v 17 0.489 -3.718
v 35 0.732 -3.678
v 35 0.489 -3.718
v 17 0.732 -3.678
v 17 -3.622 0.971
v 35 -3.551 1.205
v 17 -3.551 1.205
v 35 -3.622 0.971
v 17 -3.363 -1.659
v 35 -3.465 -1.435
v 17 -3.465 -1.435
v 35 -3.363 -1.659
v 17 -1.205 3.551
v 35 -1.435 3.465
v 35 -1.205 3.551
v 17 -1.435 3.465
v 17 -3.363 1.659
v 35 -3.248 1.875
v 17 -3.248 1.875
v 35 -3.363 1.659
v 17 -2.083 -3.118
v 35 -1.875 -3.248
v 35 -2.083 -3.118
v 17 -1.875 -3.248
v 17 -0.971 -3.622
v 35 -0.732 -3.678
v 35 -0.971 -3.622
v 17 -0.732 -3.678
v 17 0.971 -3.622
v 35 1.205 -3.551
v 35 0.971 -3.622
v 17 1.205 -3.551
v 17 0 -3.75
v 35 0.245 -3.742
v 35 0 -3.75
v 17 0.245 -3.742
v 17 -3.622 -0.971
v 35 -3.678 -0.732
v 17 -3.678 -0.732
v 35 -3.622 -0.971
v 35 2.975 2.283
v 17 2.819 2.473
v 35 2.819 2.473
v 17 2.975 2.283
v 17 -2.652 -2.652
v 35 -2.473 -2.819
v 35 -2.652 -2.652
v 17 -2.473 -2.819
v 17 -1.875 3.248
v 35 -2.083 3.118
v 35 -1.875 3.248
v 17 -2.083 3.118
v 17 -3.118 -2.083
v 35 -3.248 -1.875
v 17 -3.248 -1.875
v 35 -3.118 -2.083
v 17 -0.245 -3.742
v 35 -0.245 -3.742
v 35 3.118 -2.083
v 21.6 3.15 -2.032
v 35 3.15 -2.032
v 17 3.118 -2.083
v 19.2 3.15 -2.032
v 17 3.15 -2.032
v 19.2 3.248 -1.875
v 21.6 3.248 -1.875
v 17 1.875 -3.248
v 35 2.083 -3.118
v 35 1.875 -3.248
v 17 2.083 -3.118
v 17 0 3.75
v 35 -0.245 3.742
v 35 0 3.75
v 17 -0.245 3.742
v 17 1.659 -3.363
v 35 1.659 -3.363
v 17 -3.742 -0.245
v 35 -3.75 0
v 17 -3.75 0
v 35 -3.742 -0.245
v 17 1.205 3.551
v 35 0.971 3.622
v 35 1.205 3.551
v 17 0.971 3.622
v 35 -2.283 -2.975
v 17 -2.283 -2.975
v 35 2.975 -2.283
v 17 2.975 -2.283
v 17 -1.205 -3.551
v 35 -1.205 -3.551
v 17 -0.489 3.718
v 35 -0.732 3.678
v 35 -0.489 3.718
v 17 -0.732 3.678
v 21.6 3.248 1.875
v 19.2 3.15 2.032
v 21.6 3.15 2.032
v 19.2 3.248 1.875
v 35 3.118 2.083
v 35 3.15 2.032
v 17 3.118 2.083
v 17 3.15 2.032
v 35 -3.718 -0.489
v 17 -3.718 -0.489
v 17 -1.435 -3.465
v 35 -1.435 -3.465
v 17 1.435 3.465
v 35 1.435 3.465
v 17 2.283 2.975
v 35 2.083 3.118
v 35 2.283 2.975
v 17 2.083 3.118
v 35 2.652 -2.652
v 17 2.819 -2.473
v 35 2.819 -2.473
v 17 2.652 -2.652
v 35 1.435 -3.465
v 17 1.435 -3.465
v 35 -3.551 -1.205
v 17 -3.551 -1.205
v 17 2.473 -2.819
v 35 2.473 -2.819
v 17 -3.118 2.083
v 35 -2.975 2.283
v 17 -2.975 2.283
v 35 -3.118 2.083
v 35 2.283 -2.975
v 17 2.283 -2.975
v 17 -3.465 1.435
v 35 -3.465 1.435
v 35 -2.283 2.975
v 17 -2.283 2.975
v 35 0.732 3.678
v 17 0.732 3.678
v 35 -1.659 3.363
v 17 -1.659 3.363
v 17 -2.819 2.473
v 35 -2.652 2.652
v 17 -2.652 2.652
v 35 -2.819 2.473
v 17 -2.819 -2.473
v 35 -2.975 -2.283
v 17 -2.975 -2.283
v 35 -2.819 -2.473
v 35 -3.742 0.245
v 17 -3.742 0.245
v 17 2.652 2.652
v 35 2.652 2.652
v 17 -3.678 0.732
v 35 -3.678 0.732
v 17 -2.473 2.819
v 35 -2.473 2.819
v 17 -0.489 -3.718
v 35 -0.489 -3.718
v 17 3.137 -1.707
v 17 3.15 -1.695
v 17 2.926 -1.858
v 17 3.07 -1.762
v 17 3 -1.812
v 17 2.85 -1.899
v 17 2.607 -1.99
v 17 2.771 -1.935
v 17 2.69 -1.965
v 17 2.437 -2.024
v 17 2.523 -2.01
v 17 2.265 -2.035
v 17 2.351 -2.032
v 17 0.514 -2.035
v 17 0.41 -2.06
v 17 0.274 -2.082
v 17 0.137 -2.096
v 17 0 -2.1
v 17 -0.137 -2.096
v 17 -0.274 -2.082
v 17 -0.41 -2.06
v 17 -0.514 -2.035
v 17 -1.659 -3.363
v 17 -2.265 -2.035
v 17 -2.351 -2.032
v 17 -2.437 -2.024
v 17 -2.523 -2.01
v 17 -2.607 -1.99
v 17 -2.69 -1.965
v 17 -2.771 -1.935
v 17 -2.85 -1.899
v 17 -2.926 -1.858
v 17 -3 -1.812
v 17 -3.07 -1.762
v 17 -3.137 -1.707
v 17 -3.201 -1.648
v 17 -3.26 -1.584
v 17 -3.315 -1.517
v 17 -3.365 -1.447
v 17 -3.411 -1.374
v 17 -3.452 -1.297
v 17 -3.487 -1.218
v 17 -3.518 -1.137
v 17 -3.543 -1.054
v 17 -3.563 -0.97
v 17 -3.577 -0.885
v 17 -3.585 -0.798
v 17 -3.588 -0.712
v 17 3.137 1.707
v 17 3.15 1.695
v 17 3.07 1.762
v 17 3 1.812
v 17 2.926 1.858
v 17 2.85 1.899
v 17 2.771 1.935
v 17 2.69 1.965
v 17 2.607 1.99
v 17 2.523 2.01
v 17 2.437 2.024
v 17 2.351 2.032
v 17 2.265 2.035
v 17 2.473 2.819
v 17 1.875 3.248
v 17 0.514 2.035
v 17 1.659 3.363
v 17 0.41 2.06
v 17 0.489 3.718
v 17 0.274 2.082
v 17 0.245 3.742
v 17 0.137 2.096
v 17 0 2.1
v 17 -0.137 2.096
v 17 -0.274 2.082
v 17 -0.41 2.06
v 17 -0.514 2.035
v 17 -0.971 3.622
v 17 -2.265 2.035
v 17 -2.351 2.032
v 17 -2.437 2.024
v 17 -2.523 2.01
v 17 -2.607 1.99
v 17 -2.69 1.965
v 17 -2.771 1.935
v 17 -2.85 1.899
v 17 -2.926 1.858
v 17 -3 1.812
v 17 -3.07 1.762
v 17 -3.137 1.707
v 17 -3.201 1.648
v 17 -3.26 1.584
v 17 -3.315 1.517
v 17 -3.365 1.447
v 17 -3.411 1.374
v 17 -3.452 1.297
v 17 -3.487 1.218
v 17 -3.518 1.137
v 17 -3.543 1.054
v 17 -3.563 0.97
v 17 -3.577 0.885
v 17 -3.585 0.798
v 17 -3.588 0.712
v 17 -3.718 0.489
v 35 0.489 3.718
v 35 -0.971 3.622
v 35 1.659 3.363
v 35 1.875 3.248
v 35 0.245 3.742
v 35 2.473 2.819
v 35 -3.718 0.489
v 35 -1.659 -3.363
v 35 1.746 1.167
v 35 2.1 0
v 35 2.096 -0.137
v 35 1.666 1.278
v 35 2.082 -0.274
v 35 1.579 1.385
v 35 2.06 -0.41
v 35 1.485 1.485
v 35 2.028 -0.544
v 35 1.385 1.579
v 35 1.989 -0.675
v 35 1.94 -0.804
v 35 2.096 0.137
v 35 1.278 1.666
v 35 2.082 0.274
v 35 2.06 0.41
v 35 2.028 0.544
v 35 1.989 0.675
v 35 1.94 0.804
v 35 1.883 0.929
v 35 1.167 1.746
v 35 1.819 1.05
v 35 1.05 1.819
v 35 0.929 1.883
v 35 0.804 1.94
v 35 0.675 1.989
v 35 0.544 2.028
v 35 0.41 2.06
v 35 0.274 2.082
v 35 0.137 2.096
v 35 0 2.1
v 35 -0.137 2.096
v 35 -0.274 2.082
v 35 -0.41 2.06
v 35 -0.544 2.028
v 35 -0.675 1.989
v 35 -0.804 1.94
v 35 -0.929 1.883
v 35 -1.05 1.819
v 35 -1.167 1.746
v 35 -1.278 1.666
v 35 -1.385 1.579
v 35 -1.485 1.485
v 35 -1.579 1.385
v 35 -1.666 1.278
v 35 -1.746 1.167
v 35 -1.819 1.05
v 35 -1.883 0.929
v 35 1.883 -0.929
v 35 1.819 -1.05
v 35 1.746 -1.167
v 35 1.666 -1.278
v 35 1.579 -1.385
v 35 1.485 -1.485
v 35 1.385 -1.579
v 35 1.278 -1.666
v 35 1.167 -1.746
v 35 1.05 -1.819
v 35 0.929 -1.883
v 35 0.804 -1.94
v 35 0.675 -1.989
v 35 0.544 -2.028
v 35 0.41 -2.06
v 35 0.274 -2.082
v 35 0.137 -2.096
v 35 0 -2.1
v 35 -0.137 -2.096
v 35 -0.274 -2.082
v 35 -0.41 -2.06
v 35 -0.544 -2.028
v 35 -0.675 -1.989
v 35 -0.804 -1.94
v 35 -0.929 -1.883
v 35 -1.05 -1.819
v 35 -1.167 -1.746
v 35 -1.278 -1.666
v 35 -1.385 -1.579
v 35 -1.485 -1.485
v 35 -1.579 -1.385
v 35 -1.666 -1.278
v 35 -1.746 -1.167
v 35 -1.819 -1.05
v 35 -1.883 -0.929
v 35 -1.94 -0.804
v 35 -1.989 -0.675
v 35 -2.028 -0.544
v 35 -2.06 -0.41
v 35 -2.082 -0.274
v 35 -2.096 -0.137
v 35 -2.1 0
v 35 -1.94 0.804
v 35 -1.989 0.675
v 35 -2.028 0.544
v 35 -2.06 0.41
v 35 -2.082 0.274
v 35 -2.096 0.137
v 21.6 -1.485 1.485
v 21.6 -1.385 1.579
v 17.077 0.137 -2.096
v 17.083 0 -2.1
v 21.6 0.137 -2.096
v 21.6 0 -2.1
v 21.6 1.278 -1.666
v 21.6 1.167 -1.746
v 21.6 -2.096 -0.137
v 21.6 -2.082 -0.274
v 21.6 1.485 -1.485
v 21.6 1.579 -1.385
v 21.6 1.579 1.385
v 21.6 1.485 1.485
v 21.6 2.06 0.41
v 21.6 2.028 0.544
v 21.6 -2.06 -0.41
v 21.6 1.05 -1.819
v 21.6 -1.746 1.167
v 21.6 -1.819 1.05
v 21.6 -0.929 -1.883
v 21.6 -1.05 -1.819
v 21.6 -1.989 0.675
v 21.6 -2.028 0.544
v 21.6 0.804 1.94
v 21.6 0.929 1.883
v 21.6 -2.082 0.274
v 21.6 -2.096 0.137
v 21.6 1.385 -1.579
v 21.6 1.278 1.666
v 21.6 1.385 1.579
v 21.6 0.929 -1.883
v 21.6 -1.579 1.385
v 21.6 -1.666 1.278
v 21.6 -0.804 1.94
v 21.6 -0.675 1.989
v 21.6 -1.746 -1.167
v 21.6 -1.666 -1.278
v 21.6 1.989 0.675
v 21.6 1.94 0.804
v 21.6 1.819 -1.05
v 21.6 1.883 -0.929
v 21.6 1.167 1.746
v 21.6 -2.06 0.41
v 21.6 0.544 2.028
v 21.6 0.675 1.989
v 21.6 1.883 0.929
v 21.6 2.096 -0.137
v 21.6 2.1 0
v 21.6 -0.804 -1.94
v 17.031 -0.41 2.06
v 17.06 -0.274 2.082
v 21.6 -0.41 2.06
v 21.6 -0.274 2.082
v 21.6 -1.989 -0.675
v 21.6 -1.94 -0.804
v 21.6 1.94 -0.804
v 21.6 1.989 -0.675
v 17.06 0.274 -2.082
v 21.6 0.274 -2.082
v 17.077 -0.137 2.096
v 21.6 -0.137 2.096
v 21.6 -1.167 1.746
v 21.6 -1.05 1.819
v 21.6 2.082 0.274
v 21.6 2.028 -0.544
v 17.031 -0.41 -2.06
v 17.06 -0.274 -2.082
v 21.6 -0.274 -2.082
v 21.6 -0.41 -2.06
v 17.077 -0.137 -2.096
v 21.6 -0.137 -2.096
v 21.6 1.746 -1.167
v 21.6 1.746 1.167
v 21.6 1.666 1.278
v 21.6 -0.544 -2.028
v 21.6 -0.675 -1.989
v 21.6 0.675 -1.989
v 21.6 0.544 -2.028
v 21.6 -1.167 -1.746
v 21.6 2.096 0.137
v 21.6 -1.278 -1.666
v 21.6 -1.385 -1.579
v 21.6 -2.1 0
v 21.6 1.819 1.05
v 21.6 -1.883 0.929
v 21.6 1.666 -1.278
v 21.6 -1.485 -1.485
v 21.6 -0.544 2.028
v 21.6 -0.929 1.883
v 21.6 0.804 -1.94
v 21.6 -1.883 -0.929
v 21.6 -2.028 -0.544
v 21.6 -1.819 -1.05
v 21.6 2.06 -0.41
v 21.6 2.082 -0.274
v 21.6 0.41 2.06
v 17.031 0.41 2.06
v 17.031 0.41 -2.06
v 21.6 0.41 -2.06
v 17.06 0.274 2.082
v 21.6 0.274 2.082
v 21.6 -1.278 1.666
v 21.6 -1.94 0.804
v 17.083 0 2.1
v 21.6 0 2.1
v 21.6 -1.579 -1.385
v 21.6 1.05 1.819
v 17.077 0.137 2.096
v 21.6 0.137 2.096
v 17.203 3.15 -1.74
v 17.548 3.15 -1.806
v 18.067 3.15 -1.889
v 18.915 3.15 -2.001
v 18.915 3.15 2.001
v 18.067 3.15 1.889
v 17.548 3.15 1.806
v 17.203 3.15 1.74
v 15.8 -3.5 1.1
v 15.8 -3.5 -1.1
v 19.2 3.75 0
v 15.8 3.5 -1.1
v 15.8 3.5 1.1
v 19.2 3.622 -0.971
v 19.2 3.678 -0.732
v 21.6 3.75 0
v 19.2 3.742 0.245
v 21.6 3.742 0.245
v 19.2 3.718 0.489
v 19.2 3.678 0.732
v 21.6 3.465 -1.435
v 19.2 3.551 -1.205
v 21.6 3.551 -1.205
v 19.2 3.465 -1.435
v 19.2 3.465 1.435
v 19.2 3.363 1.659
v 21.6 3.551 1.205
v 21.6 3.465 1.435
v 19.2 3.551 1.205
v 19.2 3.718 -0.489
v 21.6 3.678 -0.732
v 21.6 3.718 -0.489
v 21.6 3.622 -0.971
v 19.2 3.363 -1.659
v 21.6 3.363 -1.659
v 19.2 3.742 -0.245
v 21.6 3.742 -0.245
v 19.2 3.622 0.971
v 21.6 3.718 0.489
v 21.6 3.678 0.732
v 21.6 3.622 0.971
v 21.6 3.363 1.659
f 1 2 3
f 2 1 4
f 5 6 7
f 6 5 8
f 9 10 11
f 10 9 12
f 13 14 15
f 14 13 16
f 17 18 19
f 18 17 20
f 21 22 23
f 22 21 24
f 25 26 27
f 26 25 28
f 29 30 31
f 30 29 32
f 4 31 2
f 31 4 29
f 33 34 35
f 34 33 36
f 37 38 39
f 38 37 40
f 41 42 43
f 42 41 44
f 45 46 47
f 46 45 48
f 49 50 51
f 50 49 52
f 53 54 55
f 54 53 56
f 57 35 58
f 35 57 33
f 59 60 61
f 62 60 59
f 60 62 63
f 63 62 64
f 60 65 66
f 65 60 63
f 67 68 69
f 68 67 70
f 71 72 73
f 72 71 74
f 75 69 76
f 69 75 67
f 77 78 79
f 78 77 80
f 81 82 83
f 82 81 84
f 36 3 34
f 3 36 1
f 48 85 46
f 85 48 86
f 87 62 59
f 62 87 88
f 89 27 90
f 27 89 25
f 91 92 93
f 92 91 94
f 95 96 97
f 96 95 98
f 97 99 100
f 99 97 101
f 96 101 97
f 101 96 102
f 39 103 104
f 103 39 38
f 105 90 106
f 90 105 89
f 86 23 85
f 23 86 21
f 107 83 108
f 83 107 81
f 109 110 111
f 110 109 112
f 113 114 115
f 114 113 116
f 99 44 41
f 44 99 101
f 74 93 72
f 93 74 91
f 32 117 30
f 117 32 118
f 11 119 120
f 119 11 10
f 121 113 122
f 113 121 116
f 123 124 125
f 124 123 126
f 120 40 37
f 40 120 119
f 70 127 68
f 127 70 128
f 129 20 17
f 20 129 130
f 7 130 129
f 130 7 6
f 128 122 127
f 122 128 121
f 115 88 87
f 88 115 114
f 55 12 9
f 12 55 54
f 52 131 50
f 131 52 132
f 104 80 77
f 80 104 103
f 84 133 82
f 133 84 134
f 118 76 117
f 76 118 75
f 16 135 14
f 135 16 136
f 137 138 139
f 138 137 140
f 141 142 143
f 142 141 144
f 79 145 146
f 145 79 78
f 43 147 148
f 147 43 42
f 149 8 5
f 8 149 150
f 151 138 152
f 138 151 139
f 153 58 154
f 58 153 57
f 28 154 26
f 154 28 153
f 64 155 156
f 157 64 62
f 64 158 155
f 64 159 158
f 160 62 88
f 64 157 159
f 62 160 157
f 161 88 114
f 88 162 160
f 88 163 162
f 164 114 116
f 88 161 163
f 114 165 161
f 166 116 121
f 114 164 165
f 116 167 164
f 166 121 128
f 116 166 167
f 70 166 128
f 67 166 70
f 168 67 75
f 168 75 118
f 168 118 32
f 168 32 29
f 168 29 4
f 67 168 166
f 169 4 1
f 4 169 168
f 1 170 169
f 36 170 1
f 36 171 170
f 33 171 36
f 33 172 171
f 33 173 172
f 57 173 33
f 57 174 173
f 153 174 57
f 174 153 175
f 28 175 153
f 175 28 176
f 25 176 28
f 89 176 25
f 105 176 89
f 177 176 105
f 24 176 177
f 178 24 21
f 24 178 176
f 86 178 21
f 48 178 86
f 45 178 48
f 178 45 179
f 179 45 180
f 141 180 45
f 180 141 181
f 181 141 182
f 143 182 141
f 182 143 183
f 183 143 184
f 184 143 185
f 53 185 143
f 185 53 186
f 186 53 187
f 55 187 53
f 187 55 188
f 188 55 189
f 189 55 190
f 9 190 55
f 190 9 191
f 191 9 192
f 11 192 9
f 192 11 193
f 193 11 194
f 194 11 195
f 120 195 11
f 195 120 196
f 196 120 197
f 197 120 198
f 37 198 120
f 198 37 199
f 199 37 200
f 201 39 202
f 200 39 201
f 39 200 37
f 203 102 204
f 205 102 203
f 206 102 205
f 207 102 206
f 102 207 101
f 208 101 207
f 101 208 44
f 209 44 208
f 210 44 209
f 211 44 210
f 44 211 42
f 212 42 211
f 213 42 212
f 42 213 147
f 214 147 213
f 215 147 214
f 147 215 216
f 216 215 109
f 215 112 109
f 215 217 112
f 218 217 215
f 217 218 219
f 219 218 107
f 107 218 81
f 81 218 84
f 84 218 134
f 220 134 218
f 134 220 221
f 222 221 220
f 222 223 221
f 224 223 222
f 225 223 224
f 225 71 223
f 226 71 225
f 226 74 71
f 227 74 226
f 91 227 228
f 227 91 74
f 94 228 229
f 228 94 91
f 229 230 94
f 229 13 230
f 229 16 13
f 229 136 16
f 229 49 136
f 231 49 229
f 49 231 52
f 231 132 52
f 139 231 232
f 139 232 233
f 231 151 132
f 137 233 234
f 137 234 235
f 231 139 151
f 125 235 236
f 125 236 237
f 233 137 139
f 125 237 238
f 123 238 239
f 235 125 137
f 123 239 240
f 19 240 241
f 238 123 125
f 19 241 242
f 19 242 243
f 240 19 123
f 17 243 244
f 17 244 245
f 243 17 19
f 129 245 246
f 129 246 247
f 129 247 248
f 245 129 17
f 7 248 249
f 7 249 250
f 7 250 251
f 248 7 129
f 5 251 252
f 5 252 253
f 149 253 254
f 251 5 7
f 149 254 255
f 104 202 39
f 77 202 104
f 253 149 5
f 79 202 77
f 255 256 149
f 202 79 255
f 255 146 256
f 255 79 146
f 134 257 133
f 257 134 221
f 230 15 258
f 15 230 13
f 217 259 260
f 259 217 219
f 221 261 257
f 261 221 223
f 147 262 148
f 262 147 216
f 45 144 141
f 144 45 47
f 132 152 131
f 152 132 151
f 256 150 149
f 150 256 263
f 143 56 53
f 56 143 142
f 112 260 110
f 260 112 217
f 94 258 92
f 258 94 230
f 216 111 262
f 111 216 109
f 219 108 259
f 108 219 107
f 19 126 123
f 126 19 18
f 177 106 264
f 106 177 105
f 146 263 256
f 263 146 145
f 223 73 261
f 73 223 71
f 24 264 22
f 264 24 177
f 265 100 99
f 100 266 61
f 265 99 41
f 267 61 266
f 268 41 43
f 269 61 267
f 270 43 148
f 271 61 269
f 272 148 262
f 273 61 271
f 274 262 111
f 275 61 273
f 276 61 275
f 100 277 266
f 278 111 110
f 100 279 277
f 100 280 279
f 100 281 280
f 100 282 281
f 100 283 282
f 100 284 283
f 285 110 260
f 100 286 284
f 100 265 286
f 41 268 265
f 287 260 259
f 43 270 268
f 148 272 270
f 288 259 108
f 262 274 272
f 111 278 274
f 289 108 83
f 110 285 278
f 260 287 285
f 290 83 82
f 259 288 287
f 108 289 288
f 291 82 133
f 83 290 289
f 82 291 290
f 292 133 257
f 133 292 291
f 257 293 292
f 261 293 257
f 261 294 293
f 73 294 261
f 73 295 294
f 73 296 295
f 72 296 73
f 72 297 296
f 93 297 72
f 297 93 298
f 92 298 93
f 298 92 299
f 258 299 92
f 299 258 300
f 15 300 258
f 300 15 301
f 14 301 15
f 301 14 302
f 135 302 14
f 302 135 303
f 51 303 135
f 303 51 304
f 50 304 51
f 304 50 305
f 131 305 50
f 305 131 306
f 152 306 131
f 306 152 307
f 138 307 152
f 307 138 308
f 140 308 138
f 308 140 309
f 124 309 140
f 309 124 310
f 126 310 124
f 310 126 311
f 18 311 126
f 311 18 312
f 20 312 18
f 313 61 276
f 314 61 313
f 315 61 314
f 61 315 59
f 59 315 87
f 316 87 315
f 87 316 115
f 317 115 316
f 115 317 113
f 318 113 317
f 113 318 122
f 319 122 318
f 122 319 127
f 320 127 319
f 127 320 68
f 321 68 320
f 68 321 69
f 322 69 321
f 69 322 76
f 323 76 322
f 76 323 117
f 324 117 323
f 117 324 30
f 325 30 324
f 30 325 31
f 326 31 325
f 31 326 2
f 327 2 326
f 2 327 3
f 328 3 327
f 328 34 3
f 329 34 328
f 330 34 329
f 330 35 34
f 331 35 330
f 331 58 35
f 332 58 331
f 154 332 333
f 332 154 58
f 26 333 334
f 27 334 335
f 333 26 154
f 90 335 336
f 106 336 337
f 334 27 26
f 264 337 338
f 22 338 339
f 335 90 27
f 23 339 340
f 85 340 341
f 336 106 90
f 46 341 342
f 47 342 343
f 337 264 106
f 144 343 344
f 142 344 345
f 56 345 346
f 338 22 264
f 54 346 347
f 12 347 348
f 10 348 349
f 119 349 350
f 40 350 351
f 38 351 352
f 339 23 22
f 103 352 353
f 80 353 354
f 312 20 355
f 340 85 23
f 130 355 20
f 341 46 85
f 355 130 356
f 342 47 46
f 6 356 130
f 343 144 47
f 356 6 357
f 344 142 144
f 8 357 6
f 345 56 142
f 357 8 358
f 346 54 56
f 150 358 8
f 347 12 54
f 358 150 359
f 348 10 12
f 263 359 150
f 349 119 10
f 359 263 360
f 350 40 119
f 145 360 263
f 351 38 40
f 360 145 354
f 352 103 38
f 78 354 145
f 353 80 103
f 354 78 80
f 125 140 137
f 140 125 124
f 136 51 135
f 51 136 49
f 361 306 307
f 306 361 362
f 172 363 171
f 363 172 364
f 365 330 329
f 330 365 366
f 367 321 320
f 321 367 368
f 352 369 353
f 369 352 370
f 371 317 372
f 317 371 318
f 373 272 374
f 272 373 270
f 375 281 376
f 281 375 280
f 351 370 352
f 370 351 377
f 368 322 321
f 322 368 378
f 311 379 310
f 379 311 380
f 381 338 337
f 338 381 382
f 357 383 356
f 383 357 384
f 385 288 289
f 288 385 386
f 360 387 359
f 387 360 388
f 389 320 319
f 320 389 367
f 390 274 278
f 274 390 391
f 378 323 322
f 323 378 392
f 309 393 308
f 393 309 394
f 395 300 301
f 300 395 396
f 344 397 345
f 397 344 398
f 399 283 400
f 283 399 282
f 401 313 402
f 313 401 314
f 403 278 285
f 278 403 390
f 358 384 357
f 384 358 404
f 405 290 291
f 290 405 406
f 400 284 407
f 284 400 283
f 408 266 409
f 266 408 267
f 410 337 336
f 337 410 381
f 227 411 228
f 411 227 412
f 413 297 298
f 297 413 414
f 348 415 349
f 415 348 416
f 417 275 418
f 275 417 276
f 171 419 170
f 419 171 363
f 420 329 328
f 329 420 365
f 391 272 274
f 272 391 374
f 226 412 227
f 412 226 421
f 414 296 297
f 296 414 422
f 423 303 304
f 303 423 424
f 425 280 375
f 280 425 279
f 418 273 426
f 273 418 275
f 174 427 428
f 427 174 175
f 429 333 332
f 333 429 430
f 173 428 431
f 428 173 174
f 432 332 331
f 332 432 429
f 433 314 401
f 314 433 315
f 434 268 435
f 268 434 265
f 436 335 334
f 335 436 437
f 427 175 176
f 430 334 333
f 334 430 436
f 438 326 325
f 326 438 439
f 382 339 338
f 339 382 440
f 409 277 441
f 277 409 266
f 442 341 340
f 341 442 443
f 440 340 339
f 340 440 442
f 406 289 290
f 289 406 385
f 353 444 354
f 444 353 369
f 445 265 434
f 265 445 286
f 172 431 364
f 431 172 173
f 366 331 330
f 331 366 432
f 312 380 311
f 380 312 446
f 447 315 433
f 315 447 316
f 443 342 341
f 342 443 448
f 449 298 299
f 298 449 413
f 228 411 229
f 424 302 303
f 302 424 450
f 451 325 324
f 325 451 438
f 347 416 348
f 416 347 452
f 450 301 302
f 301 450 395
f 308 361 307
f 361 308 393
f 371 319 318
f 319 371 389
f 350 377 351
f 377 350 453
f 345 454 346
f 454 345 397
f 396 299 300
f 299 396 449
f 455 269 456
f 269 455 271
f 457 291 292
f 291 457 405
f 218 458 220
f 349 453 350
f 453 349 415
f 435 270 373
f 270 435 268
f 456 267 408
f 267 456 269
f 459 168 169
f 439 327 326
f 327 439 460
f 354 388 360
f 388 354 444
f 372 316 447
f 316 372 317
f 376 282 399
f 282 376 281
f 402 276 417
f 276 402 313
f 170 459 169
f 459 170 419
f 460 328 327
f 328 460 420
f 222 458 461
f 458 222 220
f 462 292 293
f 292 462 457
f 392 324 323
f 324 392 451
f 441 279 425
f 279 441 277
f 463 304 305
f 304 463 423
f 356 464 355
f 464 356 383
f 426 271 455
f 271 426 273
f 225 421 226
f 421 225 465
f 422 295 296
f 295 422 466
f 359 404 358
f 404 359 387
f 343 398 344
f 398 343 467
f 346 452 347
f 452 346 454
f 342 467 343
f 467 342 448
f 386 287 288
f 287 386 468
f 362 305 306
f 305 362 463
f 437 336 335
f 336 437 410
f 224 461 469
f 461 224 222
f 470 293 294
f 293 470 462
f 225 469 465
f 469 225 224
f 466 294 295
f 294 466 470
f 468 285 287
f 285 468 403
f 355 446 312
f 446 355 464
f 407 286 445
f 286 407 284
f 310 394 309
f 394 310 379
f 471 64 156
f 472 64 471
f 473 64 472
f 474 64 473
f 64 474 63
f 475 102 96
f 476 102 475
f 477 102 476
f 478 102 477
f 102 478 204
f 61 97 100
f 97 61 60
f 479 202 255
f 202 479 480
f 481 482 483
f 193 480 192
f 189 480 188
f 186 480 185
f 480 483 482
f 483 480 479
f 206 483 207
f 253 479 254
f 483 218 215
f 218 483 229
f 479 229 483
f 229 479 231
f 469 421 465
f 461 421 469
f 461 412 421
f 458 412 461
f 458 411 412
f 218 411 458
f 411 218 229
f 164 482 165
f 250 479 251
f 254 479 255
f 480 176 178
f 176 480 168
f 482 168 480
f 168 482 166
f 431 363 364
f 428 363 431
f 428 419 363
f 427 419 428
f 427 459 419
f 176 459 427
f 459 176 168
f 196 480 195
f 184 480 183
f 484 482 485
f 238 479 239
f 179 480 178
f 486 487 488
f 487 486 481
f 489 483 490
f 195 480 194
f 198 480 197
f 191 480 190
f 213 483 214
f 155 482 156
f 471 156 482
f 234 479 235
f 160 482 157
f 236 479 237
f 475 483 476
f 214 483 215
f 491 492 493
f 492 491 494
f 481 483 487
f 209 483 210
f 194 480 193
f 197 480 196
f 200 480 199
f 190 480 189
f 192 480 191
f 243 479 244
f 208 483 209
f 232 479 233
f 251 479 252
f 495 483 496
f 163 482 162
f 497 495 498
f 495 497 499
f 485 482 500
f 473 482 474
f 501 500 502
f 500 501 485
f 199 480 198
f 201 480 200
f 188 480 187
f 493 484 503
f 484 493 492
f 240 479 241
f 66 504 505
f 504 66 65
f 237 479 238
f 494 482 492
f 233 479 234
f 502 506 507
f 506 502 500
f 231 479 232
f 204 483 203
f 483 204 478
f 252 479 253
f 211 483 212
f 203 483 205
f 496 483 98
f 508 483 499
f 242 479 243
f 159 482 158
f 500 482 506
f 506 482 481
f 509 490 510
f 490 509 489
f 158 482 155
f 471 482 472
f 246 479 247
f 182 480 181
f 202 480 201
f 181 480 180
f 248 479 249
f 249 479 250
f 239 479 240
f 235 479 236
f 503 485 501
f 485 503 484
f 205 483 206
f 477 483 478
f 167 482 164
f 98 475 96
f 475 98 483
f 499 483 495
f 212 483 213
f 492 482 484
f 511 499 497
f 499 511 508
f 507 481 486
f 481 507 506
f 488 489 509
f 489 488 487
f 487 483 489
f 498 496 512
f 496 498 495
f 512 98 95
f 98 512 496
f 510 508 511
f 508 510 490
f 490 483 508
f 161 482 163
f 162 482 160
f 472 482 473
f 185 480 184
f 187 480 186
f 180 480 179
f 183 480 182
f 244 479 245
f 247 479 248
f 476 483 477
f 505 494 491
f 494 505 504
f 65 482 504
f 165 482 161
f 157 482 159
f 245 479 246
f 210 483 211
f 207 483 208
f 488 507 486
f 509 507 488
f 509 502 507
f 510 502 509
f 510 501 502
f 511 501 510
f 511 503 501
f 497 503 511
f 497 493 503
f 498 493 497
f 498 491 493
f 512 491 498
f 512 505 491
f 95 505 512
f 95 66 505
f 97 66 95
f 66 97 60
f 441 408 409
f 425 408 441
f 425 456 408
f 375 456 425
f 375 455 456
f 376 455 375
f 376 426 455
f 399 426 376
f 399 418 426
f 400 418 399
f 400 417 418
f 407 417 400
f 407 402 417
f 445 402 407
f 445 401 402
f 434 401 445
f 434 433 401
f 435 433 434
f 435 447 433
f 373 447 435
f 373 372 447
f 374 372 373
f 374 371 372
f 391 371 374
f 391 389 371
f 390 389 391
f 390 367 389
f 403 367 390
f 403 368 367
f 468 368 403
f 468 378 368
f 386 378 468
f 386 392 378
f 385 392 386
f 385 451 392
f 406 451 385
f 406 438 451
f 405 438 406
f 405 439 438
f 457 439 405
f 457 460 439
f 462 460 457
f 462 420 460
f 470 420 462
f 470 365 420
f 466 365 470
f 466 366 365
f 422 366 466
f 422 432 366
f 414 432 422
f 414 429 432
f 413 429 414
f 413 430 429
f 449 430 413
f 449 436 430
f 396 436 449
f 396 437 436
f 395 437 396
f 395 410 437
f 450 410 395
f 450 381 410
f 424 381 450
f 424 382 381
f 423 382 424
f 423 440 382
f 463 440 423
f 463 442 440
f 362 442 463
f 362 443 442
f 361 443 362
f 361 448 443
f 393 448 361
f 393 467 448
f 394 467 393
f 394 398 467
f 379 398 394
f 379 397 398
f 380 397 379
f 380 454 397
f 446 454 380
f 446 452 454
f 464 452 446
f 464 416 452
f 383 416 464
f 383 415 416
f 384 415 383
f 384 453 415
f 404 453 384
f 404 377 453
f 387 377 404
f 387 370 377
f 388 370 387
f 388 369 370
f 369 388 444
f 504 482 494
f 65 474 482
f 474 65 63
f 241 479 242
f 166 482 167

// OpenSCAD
$fn=96;

module ring_terminal(
    ring_od=18,
    ring_id=8,
    ring_th=2.2,
    neck_len=8,
    neck_w=7,
    barrel_len=18,
    barrel_od=7.5,
    barrel_id=4.2,
    seam_gap=1.2
){
    union(){
        // Ring + neck (flat)
        linear_extrude(height=ring_th, center=true)
        union(){
            difference(){
                circle(d=ring_od);
                circle(d=ring_id);
            }
            translate([ring_od/2 + neck_len/2, 0])
                square([neck_len, neck_w], center=true);
        }

        // Barrel (crimp tube) with seam gap, centered on ring thickness
        translate([ring_od/2 + neck_len + barrel_len/2, 0, 0])
        difference(){
            // Outer tube
            rotate([0,90,0])
                cylinder(h=barrel_len, d=barrel_od, center=true);
            // Inner bore
            rotate([0,90,0])
                cylinder(h=barrel_len+0.4, d=barrel_id, center=true);
            // Seam gap cut (slot along length)
            translate([0, barrel_od/2, 0])
                cube([barrel_len+0.6, seam_gap, barrel_od*2], center=true);
        }

        // Transition fillet-ish block between neck and barrel
        translate([ring_od/2 + neck_len + 1.2, 0, 0])
            hull(){
                translate([-1.2, 0, 0])
                    cube([2.4, neck_w, ring_th], center=true);
                translate([2.2, 0, 0])
                    rotate([0,90,0])
                        cylinder(h=2.4, d=barrel_od, center=true);
            }
    }
}

ring_terminal();
